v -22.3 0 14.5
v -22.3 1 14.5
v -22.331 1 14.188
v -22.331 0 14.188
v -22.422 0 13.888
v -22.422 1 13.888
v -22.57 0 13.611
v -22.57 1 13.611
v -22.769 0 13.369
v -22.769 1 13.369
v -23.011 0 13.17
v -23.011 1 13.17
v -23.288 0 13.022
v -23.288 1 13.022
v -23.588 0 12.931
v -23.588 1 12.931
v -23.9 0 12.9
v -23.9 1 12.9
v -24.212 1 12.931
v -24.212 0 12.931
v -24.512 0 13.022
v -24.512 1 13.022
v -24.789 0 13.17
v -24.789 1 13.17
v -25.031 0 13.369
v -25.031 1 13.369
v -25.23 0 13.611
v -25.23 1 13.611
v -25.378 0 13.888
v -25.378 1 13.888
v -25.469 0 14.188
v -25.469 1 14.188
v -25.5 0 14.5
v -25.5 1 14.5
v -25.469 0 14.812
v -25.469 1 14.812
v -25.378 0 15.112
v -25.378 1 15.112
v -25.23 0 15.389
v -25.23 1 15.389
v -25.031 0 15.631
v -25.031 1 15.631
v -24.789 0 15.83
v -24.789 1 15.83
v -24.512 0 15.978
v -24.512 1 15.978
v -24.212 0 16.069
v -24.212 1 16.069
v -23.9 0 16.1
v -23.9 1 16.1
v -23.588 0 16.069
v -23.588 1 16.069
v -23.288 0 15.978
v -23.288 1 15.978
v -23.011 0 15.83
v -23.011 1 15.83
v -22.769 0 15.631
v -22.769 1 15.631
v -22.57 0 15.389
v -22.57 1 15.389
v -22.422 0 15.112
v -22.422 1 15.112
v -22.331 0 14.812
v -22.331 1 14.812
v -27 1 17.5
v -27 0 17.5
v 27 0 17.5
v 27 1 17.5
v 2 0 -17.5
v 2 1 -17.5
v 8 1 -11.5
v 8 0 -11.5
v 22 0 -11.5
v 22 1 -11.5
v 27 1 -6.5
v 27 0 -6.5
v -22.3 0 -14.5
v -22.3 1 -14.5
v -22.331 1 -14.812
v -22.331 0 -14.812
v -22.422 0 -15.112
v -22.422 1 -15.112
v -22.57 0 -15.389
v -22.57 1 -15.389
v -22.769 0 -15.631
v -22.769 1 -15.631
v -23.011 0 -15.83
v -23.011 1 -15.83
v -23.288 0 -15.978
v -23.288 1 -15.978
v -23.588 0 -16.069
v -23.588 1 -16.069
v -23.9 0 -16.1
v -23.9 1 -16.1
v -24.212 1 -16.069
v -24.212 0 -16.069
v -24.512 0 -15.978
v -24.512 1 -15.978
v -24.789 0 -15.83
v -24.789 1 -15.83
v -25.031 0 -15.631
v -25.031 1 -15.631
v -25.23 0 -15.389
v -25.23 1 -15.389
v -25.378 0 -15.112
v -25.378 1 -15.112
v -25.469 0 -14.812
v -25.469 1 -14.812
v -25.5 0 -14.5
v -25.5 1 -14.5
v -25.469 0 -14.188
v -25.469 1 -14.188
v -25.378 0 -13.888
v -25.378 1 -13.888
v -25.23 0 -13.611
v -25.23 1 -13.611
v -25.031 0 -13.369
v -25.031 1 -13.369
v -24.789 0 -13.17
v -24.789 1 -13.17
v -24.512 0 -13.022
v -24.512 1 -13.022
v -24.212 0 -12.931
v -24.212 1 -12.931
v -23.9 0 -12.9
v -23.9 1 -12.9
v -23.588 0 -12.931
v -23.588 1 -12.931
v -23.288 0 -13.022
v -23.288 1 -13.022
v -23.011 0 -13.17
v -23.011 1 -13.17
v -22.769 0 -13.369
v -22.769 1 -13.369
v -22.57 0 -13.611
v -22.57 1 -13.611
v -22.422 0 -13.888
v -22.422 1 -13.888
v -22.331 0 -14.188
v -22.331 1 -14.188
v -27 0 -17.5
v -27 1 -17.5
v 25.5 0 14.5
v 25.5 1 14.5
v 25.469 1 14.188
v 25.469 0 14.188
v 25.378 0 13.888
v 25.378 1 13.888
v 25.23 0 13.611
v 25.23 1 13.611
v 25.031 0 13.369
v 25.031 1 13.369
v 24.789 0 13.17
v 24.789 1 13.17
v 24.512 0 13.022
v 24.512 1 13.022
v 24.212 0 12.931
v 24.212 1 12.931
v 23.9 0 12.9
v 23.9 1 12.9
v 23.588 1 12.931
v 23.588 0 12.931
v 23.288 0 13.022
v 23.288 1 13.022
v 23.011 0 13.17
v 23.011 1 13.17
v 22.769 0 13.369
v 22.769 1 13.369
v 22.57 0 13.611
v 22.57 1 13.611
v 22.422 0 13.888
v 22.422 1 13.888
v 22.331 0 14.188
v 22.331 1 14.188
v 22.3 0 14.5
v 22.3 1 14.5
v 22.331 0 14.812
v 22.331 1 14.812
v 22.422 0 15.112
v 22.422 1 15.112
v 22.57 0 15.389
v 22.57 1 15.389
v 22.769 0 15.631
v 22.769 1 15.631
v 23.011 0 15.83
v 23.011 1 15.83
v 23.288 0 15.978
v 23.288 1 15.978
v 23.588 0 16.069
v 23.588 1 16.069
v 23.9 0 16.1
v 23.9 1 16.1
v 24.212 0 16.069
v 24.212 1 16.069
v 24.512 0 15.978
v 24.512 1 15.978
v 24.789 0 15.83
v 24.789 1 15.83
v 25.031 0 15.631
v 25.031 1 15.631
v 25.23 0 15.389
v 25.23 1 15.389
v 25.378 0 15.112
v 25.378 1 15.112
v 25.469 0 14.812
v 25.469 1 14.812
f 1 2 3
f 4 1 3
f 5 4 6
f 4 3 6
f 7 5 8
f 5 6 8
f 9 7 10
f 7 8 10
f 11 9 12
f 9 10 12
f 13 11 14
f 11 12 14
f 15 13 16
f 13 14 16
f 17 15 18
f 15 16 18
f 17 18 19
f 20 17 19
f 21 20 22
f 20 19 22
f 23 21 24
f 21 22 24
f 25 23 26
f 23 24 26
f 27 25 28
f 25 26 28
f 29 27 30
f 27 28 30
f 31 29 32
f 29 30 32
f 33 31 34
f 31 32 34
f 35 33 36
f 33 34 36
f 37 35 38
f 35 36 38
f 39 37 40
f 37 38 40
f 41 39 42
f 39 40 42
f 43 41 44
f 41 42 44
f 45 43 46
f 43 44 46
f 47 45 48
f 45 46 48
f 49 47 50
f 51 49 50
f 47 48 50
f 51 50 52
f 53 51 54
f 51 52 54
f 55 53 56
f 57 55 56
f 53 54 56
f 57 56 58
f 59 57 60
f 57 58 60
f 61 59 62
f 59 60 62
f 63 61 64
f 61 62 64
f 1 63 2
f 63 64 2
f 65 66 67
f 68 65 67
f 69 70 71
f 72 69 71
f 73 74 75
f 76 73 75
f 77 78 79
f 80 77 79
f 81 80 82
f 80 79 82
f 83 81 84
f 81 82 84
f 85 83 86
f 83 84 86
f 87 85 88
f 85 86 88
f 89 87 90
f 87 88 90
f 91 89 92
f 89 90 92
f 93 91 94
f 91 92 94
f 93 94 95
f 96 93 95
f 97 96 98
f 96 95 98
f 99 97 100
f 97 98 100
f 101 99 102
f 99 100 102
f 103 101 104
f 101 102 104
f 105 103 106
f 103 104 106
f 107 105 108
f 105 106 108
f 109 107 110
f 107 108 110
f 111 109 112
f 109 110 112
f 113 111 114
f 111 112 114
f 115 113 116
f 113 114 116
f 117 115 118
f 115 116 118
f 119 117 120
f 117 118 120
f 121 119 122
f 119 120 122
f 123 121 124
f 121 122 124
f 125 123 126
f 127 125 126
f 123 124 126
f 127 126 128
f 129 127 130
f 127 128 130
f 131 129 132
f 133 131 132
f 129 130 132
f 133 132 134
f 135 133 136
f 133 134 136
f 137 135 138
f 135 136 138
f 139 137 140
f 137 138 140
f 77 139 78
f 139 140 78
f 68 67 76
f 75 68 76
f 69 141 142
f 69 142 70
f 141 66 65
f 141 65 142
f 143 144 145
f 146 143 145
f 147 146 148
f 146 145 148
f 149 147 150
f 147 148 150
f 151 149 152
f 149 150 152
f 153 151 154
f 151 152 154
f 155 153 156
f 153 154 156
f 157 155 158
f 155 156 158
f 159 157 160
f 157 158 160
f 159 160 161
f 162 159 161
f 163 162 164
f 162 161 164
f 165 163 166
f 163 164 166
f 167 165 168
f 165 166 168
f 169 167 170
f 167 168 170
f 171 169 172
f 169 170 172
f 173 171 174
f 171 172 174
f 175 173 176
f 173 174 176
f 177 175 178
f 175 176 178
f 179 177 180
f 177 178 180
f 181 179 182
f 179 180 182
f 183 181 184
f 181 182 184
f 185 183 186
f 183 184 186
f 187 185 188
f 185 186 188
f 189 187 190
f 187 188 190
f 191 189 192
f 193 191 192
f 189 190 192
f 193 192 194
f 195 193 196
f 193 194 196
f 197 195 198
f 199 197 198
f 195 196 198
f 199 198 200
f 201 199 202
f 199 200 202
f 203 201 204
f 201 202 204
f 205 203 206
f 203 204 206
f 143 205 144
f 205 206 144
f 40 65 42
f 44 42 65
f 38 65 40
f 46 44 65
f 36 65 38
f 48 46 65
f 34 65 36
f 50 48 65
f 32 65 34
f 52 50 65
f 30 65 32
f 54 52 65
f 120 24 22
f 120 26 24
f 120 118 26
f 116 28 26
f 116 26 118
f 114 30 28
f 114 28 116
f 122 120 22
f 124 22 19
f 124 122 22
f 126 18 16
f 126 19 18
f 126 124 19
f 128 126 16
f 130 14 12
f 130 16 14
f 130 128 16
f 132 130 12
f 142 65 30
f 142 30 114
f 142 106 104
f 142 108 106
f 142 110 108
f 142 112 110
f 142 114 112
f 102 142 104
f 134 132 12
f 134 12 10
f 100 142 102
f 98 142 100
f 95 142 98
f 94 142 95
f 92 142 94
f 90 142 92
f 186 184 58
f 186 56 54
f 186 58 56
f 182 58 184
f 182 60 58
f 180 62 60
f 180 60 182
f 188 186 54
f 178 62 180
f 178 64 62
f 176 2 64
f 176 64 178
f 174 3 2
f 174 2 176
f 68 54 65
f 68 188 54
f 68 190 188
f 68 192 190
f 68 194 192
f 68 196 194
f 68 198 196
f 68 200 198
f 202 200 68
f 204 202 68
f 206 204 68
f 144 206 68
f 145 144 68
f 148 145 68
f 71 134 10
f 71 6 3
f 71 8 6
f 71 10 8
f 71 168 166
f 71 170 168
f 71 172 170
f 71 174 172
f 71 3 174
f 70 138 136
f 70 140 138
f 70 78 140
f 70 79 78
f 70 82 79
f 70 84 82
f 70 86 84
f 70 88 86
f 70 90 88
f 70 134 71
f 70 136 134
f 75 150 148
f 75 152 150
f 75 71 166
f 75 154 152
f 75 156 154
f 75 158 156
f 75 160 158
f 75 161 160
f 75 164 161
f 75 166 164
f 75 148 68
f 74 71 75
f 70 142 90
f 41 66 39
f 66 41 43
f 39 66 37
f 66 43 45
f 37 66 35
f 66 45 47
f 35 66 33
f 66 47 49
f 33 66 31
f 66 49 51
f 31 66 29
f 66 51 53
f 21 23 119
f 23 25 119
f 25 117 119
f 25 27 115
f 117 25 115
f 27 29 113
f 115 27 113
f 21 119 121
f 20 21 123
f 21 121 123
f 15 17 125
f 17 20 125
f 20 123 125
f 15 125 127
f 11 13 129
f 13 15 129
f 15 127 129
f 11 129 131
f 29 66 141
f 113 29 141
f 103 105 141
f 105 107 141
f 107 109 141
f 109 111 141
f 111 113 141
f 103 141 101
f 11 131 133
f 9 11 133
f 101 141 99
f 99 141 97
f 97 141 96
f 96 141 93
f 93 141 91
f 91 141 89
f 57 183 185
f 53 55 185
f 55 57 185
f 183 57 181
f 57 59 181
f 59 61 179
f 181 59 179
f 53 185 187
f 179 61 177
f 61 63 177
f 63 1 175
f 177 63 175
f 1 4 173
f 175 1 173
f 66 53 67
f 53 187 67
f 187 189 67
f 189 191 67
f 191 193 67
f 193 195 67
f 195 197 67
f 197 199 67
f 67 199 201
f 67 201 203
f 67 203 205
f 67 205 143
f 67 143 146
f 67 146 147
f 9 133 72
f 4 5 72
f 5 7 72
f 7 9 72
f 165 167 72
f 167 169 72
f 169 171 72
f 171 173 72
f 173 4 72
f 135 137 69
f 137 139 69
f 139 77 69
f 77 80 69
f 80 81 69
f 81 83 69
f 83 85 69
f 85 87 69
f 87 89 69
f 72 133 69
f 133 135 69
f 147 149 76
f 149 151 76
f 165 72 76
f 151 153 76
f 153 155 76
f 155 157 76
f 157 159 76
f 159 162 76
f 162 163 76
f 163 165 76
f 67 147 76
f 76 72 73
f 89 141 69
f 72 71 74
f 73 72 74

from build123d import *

# Parameters (mm, degrees)
SKETCH_1_W          = 54
SKETCH_1_H          = 35
EXTRUDE_1_DEPTH     = 1
CUT_EXTRUDE_1_DEPTH = 1
SKETCH_3_R          = 1.6
CUT_EXTRUDE_2_DEPTH = 1


with BuildPart() as part:
    # Эскиз1 → Бобышка-Вытянуть1 (new body)
    with BuildSketch(Plane(origin=(0, 0, 0), x_dir=(1, 0, 0), z_dir=(0, 1, 0))):
        Rectangle(SKETCH_1_W, SKETCH_1_H)
    extrude(amount=EXTRUDE_1_DEPTH)

    # Эскиз2 → Вырез-Вытянуть1 (cut)
    with BuildSketch(Plane(origin=(0, 1, 0), x_dir=(1, 0, 0), z_dir=(0, 1, 0))):
        Polygon((2, 17.5), (8, 11.5), (22, 11.5), (27, 6.5), (27, 17.5), align=None)
    extrude(amount=-CUT_EXTRUDE_1_DEPTH, mode=Mode.SUBTRACT)

    # Эскиз3 → Вырез-Вытянуть2 (cut)
    with BuildSketch(Plane(origin=(0, 1, 0), x_dir=(1, 0, 0), z_dir=(0, 1, 0))):
        with Locations((-23.9, 14.5)):
            Circle(SKETCH_3_R)
        with Locations((-23.9, -14.5)):
            Circle(SKETCH_3_R)
        with Locations((23.9, -14.5)):
            Circle(SKETCH_3_R)
    extrude(amount=-CUT_EXTRUDE_2_DEPTH, mode=Mode.SUBTRACT)


solid = part.part
